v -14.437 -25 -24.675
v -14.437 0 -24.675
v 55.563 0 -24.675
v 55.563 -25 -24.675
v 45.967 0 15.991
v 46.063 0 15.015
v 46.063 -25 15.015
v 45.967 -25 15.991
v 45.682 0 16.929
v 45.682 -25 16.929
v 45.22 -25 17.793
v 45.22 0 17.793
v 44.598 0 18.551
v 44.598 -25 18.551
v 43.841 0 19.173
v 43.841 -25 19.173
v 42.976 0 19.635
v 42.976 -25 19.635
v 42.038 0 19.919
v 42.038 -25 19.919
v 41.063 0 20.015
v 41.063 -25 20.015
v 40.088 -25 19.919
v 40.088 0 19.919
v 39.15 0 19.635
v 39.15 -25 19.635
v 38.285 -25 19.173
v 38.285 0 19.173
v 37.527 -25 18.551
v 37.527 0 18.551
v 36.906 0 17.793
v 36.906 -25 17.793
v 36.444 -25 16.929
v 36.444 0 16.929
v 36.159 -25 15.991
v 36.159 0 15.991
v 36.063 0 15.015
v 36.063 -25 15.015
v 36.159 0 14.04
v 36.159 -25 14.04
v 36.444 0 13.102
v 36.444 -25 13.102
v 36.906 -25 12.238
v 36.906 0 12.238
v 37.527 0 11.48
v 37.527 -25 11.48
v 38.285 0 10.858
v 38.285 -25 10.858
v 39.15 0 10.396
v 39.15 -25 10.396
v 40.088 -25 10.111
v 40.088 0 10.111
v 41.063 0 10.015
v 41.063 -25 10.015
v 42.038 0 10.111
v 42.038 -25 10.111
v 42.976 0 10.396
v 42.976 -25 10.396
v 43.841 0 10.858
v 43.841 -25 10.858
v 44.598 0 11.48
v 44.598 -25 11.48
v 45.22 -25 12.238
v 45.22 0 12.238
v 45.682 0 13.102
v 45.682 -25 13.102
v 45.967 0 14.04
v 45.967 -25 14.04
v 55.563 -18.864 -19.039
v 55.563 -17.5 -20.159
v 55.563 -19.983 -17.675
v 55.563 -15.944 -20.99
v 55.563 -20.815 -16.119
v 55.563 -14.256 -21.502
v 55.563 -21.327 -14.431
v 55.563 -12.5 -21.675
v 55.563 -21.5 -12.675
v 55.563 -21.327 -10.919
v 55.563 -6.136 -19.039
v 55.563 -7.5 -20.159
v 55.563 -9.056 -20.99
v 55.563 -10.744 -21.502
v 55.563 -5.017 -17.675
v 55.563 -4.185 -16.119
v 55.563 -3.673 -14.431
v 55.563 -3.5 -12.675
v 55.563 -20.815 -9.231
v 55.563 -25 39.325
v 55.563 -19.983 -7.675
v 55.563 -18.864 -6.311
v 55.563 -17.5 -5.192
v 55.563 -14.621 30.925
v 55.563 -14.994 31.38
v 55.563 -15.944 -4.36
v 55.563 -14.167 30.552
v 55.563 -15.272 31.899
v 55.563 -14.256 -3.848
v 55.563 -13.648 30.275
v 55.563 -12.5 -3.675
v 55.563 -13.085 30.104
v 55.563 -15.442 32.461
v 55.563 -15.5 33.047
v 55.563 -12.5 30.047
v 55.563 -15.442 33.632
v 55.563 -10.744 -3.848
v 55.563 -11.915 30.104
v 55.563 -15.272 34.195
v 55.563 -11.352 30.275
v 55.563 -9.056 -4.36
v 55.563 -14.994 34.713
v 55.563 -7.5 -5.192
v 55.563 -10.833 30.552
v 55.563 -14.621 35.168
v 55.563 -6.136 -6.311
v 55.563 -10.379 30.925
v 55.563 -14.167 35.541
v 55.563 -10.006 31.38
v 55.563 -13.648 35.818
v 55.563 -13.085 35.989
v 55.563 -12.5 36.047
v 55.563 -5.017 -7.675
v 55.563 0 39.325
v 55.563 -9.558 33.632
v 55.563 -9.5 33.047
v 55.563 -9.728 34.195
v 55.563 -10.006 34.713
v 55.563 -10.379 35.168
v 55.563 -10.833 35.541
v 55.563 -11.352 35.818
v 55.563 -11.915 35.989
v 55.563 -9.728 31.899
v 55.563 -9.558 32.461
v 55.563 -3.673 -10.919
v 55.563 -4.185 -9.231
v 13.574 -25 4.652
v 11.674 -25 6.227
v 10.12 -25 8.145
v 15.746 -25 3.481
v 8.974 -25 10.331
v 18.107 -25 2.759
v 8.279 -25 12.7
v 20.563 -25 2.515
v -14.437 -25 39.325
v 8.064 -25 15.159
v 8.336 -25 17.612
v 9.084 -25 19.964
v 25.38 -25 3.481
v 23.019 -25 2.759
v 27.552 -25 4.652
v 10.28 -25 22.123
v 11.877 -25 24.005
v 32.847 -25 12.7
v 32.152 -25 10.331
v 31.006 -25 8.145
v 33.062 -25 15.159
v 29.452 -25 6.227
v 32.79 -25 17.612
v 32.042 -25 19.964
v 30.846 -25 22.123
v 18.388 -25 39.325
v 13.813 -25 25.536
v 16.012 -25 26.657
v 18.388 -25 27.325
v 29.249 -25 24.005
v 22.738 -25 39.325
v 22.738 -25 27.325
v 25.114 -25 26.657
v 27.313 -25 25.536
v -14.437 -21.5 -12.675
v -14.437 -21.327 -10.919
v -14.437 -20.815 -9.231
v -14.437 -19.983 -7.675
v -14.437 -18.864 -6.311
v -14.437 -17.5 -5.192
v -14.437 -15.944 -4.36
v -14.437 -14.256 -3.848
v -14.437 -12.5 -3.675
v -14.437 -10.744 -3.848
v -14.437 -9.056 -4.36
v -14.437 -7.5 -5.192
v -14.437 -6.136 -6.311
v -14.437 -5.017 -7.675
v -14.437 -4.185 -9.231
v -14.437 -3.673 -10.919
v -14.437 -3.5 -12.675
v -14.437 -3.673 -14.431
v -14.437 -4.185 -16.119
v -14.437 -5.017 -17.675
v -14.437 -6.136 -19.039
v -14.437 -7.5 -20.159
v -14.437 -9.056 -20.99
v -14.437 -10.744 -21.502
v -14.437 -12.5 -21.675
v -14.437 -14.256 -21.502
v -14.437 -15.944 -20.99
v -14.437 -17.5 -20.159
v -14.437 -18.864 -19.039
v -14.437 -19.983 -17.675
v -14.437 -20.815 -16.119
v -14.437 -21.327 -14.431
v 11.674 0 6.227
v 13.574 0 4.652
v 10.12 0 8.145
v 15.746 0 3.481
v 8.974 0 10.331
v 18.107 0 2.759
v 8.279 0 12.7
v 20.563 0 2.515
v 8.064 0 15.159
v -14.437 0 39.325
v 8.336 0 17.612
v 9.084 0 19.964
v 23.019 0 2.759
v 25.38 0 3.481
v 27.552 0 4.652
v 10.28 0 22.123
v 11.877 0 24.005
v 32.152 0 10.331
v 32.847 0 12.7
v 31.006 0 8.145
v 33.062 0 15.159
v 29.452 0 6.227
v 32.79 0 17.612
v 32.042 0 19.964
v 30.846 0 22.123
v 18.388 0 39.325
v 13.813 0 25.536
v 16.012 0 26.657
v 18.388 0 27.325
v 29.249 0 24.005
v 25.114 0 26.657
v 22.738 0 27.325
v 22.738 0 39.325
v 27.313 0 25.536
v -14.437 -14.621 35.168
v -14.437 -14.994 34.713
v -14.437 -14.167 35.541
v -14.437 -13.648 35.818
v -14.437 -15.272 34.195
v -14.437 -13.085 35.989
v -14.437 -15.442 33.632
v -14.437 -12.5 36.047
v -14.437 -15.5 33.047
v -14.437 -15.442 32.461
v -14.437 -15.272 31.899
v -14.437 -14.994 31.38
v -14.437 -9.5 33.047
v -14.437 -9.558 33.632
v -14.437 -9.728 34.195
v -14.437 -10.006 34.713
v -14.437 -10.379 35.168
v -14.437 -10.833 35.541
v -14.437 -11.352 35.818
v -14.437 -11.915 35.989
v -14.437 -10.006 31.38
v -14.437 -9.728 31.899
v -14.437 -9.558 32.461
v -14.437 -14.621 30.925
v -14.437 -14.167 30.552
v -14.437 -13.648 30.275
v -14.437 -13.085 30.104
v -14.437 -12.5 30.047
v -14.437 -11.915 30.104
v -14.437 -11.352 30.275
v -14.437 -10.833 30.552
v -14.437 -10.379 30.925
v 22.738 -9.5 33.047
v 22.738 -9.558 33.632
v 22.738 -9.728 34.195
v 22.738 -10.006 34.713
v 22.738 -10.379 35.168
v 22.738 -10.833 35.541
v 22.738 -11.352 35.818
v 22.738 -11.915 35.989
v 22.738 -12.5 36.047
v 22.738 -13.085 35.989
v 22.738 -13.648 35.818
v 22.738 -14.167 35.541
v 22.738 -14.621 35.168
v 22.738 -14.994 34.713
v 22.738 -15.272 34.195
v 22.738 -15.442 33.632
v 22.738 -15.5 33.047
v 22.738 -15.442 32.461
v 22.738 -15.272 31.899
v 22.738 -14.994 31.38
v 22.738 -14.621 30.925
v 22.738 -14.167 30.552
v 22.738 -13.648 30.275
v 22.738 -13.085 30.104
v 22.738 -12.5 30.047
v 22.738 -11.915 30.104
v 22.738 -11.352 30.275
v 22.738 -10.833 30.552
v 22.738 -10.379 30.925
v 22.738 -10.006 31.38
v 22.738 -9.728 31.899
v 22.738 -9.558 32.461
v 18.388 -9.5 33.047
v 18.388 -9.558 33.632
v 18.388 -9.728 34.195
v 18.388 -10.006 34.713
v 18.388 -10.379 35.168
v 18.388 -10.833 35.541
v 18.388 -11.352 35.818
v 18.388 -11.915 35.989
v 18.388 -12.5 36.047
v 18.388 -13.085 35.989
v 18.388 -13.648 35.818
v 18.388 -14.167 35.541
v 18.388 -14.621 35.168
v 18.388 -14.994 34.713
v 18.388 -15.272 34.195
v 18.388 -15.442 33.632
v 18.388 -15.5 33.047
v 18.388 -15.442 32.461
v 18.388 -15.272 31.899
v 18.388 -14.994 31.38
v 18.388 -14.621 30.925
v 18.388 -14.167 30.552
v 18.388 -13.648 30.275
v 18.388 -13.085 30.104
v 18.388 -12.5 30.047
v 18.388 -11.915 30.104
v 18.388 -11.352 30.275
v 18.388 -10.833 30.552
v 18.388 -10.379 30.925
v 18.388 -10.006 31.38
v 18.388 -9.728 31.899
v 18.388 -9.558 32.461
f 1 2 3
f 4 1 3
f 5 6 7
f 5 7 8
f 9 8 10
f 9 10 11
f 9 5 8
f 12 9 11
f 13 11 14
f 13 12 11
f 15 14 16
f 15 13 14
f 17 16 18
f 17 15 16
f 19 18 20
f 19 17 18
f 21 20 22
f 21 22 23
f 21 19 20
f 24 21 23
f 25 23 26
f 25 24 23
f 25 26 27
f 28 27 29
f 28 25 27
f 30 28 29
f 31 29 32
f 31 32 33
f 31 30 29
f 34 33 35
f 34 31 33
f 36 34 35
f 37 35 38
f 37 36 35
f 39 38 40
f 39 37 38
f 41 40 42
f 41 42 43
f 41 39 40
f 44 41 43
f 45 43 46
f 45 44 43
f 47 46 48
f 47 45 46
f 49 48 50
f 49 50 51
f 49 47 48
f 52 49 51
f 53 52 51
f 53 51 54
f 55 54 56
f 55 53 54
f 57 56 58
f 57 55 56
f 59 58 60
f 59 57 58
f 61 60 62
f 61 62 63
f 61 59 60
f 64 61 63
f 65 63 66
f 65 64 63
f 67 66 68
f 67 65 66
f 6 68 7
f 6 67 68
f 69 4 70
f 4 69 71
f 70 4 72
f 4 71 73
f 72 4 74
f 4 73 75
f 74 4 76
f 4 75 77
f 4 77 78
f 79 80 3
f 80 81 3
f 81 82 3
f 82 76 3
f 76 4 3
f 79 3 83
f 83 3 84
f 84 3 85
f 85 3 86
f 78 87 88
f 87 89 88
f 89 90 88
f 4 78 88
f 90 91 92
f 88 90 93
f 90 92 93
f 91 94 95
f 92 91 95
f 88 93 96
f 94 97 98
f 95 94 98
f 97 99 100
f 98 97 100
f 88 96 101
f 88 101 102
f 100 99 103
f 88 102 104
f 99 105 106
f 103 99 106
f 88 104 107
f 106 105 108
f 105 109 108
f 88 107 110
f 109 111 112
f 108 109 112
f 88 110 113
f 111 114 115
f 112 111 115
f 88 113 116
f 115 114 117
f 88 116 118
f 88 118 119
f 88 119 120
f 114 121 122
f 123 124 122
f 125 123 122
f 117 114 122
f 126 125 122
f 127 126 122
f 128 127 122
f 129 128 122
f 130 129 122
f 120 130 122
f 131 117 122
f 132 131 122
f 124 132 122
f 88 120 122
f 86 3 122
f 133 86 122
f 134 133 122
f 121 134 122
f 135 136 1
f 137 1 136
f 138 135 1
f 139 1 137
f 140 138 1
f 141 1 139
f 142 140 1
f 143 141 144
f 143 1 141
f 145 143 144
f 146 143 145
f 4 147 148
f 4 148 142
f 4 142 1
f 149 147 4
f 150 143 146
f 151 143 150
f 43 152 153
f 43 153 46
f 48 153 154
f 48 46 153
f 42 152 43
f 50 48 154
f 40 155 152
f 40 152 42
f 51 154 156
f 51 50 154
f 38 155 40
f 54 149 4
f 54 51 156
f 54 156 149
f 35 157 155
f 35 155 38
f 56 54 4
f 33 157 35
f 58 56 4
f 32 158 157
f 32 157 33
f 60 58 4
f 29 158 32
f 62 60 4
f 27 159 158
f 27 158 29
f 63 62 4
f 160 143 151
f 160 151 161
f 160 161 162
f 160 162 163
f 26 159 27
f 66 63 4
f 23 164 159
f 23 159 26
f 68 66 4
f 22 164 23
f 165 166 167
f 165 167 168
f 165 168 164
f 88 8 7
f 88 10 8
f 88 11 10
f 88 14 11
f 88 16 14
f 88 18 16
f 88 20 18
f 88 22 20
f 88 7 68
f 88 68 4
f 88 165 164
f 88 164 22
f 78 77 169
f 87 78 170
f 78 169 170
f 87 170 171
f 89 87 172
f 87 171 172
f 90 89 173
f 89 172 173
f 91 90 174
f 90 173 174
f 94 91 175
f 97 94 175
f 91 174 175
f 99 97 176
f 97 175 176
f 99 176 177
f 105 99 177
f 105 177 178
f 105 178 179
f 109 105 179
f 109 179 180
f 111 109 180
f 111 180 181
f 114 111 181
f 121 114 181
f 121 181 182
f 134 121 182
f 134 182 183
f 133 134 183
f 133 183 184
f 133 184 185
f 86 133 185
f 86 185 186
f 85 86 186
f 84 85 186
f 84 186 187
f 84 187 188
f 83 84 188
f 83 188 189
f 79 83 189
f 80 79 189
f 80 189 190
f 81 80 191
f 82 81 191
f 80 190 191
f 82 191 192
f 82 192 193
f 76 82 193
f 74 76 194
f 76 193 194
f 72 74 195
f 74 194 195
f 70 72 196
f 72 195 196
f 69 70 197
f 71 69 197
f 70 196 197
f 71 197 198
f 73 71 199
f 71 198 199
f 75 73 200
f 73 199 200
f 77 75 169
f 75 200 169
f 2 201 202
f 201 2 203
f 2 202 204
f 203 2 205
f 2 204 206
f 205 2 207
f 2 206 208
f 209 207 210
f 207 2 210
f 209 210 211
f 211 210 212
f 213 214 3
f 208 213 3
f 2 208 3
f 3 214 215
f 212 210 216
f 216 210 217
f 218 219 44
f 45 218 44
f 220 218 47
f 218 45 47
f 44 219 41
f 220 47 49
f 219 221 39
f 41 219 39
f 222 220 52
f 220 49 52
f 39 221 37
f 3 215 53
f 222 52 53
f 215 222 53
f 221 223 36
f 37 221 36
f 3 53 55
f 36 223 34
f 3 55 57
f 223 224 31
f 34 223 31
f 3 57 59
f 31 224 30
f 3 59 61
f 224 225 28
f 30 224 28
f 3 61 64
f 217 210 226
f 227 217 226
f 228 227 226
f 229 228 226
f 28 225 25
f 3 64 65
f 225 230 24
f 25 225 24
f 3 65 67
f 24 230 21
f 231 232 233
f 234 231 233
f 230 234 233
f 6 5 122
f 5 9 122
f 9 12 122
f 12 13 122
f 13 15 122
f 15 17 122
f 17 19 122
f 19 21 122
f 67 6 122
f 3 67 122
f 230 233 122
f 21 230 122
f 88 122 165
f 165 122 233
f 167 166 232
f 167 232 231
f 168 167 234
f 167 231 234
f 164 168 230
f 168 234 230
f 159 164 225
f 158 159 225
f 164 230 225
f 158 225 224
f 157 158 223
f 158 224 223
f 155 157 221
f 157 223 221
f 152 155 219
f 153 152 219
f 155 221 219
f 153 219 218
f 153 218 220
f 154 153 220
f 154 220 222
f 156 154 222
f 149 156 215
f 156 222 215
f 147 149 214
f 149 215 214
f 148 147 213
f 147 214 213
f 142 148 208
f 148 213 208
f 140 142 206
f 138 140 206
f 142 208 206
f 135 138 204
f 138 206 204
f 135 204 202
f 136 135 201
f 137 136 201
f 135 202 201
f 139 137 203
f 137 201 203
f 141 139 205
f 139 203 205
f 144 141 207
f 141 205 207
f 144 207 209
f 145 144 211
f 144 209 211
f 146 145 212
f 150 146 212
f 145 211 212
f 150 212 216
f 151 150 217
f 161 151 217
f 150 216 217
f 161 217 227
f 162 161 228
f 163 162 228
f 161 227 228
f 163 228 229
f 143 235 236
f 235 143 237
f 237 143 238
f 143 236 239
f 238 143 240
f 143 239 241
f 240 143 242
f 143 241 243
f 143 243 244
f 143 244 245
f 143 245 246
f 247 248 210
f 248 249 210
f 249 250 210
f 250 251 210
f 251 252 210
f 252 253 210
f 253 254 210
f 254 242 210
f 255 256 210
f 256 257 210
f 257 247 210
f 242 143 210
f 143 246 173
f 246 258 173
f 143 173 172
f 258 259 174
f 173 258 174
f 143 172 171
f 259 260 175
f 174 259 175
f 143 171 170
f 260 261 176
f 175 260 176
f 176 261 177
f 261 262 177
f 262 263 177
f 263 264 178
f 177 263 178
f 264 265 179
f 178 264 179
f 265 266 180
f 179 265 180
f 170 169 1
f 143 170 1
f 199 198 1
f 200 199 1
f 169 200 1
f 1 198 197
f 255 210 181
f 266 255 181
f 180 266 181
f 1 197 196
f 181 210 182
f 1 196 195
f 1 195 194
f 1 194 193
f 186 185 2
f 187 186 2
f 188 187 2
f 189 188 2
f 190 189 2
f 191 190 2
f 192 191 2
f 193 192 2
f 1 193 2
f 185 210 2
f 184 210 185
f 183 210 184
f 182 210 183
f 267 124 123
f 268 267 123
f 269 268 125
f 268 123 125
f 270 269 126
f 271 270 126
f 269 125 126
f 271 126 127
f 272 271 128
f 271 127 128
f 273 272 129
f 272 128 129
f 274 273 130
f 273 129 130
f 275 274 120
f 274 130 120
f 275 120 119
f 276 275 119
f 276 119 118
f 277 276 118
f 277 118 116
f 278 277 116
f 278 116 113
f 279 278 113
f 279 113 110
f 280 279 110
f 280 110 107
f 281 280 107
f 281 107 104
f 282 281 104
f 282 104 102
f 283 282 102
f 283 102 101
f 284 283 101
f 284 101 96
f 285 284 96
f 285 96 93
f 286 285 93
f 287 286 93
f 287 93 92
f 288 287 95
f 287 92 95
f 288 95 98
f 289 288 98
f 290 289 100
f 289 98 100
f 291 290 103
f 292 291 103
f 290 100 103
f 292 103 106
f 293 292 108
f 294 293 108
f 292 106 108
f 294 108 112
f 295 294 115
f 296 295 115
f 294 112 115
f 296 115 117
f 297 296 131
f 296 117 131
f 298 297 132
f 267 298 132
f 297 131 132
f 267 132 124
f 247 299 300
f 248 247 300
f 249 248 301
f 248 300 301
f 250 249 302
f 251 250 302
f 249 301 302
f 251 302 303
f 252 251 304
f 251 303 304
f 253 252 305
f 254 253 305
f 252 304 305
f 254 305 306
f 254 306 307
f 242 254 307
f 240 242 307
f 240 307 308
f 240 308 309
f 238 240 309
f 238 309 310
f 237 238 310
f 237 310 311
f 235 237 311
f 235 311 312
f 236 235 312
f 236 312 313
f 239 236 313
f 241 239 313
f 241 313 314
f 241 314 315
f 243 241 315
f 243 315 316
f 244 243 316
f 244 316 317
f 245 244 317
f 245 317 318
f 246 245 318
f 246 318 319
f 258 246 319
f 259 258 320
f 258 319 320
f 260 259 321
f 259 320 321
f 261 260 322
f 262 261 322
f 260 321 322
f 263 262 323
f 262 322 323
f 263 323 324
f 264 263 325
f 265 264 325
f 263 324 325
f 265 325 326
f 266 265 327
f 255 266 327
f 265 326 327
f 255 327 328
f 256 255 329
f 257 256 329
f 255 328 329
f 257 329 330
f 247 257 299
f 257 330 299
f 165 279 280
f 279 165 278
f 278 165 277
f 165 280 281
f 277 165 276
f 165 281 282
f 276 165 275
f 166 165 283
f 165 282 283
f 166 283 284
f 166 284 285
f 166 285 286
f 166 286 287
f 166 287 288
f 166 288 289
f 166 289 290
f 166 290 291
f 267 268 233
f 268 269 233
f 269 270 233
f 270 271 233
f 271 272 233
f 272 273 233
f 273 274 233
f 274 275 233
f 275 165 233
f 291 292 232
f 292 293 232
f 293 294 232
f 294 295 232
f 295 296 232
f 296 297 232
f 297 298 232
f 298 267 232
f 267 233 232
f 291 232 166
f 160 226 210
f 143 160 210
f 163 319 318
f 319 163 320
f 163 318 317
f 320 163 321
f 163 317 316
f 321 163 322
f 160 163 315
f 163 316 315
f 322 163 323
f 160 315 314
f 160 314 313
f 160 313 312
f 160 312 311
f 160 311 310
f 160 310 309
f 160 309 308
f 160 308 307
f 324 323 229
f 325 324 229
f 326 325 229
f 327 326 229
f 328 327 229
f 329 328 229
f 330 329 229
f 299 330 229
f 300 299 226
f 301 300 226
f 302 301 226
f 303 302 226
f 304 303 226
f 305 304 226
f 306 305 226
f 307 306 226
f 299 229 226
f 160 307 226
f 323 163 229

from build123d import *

# Parameters (mm, degrees)
F0_R     = 5
F1_DEPTH = 25
F3_D     = 6
F5_D     = 18


with BuildPart() as f1:
    # F0 (on Front) → F1 (new body)
    with BuildSketch(Plane.XZ):
        with BuildLine():
            ThreePointArc((22.737747, 27.324713), (20.562966, 2.515353), (18.388185, 27.324713))
            Line((18.388185, 27.324713), (18.388185, 39.324713))
            Line((18.388185, 39.324713), (-14.437034, 39.324713))
            Line((-14.437034, 39.324713), (-14.437034, -24.675287))
            Line((-14.437034, -24.675287), (20.562966, -24.675287))
            Line((20.562966, -24.675287), (55.562966, -24.675287))
            Line((55.562966, -24.675287), (55.562966, 39.324713))
            Line((55.562966, 39.324713), (22.737747, 39.324713))
            Line((22.737747, 39.324713), (22.737747, 27.324713))
        make_face()
        with Locations((41.062966, 15.015353)):
            Circle(F0_R, mode=Mode.SUBTRACT)
    extrude(amount=F1_DEPTH)

    # F3 (through all)
    with Locations(Plane(origin=(-14.437034, 0, 0), x_dir=(0, -1, 0), z_dir=(-1, 0, 0))):
        with Locations((12.5, 33.046592)):
            Hole(F3_D / 2)

    # F5 (through all)
    with Locations(Plane.YZ.offset(55.562966)):
        with Locations((-12.5, -12.675287)):
            Hole(F5_D / 2)


solid = f1.part
